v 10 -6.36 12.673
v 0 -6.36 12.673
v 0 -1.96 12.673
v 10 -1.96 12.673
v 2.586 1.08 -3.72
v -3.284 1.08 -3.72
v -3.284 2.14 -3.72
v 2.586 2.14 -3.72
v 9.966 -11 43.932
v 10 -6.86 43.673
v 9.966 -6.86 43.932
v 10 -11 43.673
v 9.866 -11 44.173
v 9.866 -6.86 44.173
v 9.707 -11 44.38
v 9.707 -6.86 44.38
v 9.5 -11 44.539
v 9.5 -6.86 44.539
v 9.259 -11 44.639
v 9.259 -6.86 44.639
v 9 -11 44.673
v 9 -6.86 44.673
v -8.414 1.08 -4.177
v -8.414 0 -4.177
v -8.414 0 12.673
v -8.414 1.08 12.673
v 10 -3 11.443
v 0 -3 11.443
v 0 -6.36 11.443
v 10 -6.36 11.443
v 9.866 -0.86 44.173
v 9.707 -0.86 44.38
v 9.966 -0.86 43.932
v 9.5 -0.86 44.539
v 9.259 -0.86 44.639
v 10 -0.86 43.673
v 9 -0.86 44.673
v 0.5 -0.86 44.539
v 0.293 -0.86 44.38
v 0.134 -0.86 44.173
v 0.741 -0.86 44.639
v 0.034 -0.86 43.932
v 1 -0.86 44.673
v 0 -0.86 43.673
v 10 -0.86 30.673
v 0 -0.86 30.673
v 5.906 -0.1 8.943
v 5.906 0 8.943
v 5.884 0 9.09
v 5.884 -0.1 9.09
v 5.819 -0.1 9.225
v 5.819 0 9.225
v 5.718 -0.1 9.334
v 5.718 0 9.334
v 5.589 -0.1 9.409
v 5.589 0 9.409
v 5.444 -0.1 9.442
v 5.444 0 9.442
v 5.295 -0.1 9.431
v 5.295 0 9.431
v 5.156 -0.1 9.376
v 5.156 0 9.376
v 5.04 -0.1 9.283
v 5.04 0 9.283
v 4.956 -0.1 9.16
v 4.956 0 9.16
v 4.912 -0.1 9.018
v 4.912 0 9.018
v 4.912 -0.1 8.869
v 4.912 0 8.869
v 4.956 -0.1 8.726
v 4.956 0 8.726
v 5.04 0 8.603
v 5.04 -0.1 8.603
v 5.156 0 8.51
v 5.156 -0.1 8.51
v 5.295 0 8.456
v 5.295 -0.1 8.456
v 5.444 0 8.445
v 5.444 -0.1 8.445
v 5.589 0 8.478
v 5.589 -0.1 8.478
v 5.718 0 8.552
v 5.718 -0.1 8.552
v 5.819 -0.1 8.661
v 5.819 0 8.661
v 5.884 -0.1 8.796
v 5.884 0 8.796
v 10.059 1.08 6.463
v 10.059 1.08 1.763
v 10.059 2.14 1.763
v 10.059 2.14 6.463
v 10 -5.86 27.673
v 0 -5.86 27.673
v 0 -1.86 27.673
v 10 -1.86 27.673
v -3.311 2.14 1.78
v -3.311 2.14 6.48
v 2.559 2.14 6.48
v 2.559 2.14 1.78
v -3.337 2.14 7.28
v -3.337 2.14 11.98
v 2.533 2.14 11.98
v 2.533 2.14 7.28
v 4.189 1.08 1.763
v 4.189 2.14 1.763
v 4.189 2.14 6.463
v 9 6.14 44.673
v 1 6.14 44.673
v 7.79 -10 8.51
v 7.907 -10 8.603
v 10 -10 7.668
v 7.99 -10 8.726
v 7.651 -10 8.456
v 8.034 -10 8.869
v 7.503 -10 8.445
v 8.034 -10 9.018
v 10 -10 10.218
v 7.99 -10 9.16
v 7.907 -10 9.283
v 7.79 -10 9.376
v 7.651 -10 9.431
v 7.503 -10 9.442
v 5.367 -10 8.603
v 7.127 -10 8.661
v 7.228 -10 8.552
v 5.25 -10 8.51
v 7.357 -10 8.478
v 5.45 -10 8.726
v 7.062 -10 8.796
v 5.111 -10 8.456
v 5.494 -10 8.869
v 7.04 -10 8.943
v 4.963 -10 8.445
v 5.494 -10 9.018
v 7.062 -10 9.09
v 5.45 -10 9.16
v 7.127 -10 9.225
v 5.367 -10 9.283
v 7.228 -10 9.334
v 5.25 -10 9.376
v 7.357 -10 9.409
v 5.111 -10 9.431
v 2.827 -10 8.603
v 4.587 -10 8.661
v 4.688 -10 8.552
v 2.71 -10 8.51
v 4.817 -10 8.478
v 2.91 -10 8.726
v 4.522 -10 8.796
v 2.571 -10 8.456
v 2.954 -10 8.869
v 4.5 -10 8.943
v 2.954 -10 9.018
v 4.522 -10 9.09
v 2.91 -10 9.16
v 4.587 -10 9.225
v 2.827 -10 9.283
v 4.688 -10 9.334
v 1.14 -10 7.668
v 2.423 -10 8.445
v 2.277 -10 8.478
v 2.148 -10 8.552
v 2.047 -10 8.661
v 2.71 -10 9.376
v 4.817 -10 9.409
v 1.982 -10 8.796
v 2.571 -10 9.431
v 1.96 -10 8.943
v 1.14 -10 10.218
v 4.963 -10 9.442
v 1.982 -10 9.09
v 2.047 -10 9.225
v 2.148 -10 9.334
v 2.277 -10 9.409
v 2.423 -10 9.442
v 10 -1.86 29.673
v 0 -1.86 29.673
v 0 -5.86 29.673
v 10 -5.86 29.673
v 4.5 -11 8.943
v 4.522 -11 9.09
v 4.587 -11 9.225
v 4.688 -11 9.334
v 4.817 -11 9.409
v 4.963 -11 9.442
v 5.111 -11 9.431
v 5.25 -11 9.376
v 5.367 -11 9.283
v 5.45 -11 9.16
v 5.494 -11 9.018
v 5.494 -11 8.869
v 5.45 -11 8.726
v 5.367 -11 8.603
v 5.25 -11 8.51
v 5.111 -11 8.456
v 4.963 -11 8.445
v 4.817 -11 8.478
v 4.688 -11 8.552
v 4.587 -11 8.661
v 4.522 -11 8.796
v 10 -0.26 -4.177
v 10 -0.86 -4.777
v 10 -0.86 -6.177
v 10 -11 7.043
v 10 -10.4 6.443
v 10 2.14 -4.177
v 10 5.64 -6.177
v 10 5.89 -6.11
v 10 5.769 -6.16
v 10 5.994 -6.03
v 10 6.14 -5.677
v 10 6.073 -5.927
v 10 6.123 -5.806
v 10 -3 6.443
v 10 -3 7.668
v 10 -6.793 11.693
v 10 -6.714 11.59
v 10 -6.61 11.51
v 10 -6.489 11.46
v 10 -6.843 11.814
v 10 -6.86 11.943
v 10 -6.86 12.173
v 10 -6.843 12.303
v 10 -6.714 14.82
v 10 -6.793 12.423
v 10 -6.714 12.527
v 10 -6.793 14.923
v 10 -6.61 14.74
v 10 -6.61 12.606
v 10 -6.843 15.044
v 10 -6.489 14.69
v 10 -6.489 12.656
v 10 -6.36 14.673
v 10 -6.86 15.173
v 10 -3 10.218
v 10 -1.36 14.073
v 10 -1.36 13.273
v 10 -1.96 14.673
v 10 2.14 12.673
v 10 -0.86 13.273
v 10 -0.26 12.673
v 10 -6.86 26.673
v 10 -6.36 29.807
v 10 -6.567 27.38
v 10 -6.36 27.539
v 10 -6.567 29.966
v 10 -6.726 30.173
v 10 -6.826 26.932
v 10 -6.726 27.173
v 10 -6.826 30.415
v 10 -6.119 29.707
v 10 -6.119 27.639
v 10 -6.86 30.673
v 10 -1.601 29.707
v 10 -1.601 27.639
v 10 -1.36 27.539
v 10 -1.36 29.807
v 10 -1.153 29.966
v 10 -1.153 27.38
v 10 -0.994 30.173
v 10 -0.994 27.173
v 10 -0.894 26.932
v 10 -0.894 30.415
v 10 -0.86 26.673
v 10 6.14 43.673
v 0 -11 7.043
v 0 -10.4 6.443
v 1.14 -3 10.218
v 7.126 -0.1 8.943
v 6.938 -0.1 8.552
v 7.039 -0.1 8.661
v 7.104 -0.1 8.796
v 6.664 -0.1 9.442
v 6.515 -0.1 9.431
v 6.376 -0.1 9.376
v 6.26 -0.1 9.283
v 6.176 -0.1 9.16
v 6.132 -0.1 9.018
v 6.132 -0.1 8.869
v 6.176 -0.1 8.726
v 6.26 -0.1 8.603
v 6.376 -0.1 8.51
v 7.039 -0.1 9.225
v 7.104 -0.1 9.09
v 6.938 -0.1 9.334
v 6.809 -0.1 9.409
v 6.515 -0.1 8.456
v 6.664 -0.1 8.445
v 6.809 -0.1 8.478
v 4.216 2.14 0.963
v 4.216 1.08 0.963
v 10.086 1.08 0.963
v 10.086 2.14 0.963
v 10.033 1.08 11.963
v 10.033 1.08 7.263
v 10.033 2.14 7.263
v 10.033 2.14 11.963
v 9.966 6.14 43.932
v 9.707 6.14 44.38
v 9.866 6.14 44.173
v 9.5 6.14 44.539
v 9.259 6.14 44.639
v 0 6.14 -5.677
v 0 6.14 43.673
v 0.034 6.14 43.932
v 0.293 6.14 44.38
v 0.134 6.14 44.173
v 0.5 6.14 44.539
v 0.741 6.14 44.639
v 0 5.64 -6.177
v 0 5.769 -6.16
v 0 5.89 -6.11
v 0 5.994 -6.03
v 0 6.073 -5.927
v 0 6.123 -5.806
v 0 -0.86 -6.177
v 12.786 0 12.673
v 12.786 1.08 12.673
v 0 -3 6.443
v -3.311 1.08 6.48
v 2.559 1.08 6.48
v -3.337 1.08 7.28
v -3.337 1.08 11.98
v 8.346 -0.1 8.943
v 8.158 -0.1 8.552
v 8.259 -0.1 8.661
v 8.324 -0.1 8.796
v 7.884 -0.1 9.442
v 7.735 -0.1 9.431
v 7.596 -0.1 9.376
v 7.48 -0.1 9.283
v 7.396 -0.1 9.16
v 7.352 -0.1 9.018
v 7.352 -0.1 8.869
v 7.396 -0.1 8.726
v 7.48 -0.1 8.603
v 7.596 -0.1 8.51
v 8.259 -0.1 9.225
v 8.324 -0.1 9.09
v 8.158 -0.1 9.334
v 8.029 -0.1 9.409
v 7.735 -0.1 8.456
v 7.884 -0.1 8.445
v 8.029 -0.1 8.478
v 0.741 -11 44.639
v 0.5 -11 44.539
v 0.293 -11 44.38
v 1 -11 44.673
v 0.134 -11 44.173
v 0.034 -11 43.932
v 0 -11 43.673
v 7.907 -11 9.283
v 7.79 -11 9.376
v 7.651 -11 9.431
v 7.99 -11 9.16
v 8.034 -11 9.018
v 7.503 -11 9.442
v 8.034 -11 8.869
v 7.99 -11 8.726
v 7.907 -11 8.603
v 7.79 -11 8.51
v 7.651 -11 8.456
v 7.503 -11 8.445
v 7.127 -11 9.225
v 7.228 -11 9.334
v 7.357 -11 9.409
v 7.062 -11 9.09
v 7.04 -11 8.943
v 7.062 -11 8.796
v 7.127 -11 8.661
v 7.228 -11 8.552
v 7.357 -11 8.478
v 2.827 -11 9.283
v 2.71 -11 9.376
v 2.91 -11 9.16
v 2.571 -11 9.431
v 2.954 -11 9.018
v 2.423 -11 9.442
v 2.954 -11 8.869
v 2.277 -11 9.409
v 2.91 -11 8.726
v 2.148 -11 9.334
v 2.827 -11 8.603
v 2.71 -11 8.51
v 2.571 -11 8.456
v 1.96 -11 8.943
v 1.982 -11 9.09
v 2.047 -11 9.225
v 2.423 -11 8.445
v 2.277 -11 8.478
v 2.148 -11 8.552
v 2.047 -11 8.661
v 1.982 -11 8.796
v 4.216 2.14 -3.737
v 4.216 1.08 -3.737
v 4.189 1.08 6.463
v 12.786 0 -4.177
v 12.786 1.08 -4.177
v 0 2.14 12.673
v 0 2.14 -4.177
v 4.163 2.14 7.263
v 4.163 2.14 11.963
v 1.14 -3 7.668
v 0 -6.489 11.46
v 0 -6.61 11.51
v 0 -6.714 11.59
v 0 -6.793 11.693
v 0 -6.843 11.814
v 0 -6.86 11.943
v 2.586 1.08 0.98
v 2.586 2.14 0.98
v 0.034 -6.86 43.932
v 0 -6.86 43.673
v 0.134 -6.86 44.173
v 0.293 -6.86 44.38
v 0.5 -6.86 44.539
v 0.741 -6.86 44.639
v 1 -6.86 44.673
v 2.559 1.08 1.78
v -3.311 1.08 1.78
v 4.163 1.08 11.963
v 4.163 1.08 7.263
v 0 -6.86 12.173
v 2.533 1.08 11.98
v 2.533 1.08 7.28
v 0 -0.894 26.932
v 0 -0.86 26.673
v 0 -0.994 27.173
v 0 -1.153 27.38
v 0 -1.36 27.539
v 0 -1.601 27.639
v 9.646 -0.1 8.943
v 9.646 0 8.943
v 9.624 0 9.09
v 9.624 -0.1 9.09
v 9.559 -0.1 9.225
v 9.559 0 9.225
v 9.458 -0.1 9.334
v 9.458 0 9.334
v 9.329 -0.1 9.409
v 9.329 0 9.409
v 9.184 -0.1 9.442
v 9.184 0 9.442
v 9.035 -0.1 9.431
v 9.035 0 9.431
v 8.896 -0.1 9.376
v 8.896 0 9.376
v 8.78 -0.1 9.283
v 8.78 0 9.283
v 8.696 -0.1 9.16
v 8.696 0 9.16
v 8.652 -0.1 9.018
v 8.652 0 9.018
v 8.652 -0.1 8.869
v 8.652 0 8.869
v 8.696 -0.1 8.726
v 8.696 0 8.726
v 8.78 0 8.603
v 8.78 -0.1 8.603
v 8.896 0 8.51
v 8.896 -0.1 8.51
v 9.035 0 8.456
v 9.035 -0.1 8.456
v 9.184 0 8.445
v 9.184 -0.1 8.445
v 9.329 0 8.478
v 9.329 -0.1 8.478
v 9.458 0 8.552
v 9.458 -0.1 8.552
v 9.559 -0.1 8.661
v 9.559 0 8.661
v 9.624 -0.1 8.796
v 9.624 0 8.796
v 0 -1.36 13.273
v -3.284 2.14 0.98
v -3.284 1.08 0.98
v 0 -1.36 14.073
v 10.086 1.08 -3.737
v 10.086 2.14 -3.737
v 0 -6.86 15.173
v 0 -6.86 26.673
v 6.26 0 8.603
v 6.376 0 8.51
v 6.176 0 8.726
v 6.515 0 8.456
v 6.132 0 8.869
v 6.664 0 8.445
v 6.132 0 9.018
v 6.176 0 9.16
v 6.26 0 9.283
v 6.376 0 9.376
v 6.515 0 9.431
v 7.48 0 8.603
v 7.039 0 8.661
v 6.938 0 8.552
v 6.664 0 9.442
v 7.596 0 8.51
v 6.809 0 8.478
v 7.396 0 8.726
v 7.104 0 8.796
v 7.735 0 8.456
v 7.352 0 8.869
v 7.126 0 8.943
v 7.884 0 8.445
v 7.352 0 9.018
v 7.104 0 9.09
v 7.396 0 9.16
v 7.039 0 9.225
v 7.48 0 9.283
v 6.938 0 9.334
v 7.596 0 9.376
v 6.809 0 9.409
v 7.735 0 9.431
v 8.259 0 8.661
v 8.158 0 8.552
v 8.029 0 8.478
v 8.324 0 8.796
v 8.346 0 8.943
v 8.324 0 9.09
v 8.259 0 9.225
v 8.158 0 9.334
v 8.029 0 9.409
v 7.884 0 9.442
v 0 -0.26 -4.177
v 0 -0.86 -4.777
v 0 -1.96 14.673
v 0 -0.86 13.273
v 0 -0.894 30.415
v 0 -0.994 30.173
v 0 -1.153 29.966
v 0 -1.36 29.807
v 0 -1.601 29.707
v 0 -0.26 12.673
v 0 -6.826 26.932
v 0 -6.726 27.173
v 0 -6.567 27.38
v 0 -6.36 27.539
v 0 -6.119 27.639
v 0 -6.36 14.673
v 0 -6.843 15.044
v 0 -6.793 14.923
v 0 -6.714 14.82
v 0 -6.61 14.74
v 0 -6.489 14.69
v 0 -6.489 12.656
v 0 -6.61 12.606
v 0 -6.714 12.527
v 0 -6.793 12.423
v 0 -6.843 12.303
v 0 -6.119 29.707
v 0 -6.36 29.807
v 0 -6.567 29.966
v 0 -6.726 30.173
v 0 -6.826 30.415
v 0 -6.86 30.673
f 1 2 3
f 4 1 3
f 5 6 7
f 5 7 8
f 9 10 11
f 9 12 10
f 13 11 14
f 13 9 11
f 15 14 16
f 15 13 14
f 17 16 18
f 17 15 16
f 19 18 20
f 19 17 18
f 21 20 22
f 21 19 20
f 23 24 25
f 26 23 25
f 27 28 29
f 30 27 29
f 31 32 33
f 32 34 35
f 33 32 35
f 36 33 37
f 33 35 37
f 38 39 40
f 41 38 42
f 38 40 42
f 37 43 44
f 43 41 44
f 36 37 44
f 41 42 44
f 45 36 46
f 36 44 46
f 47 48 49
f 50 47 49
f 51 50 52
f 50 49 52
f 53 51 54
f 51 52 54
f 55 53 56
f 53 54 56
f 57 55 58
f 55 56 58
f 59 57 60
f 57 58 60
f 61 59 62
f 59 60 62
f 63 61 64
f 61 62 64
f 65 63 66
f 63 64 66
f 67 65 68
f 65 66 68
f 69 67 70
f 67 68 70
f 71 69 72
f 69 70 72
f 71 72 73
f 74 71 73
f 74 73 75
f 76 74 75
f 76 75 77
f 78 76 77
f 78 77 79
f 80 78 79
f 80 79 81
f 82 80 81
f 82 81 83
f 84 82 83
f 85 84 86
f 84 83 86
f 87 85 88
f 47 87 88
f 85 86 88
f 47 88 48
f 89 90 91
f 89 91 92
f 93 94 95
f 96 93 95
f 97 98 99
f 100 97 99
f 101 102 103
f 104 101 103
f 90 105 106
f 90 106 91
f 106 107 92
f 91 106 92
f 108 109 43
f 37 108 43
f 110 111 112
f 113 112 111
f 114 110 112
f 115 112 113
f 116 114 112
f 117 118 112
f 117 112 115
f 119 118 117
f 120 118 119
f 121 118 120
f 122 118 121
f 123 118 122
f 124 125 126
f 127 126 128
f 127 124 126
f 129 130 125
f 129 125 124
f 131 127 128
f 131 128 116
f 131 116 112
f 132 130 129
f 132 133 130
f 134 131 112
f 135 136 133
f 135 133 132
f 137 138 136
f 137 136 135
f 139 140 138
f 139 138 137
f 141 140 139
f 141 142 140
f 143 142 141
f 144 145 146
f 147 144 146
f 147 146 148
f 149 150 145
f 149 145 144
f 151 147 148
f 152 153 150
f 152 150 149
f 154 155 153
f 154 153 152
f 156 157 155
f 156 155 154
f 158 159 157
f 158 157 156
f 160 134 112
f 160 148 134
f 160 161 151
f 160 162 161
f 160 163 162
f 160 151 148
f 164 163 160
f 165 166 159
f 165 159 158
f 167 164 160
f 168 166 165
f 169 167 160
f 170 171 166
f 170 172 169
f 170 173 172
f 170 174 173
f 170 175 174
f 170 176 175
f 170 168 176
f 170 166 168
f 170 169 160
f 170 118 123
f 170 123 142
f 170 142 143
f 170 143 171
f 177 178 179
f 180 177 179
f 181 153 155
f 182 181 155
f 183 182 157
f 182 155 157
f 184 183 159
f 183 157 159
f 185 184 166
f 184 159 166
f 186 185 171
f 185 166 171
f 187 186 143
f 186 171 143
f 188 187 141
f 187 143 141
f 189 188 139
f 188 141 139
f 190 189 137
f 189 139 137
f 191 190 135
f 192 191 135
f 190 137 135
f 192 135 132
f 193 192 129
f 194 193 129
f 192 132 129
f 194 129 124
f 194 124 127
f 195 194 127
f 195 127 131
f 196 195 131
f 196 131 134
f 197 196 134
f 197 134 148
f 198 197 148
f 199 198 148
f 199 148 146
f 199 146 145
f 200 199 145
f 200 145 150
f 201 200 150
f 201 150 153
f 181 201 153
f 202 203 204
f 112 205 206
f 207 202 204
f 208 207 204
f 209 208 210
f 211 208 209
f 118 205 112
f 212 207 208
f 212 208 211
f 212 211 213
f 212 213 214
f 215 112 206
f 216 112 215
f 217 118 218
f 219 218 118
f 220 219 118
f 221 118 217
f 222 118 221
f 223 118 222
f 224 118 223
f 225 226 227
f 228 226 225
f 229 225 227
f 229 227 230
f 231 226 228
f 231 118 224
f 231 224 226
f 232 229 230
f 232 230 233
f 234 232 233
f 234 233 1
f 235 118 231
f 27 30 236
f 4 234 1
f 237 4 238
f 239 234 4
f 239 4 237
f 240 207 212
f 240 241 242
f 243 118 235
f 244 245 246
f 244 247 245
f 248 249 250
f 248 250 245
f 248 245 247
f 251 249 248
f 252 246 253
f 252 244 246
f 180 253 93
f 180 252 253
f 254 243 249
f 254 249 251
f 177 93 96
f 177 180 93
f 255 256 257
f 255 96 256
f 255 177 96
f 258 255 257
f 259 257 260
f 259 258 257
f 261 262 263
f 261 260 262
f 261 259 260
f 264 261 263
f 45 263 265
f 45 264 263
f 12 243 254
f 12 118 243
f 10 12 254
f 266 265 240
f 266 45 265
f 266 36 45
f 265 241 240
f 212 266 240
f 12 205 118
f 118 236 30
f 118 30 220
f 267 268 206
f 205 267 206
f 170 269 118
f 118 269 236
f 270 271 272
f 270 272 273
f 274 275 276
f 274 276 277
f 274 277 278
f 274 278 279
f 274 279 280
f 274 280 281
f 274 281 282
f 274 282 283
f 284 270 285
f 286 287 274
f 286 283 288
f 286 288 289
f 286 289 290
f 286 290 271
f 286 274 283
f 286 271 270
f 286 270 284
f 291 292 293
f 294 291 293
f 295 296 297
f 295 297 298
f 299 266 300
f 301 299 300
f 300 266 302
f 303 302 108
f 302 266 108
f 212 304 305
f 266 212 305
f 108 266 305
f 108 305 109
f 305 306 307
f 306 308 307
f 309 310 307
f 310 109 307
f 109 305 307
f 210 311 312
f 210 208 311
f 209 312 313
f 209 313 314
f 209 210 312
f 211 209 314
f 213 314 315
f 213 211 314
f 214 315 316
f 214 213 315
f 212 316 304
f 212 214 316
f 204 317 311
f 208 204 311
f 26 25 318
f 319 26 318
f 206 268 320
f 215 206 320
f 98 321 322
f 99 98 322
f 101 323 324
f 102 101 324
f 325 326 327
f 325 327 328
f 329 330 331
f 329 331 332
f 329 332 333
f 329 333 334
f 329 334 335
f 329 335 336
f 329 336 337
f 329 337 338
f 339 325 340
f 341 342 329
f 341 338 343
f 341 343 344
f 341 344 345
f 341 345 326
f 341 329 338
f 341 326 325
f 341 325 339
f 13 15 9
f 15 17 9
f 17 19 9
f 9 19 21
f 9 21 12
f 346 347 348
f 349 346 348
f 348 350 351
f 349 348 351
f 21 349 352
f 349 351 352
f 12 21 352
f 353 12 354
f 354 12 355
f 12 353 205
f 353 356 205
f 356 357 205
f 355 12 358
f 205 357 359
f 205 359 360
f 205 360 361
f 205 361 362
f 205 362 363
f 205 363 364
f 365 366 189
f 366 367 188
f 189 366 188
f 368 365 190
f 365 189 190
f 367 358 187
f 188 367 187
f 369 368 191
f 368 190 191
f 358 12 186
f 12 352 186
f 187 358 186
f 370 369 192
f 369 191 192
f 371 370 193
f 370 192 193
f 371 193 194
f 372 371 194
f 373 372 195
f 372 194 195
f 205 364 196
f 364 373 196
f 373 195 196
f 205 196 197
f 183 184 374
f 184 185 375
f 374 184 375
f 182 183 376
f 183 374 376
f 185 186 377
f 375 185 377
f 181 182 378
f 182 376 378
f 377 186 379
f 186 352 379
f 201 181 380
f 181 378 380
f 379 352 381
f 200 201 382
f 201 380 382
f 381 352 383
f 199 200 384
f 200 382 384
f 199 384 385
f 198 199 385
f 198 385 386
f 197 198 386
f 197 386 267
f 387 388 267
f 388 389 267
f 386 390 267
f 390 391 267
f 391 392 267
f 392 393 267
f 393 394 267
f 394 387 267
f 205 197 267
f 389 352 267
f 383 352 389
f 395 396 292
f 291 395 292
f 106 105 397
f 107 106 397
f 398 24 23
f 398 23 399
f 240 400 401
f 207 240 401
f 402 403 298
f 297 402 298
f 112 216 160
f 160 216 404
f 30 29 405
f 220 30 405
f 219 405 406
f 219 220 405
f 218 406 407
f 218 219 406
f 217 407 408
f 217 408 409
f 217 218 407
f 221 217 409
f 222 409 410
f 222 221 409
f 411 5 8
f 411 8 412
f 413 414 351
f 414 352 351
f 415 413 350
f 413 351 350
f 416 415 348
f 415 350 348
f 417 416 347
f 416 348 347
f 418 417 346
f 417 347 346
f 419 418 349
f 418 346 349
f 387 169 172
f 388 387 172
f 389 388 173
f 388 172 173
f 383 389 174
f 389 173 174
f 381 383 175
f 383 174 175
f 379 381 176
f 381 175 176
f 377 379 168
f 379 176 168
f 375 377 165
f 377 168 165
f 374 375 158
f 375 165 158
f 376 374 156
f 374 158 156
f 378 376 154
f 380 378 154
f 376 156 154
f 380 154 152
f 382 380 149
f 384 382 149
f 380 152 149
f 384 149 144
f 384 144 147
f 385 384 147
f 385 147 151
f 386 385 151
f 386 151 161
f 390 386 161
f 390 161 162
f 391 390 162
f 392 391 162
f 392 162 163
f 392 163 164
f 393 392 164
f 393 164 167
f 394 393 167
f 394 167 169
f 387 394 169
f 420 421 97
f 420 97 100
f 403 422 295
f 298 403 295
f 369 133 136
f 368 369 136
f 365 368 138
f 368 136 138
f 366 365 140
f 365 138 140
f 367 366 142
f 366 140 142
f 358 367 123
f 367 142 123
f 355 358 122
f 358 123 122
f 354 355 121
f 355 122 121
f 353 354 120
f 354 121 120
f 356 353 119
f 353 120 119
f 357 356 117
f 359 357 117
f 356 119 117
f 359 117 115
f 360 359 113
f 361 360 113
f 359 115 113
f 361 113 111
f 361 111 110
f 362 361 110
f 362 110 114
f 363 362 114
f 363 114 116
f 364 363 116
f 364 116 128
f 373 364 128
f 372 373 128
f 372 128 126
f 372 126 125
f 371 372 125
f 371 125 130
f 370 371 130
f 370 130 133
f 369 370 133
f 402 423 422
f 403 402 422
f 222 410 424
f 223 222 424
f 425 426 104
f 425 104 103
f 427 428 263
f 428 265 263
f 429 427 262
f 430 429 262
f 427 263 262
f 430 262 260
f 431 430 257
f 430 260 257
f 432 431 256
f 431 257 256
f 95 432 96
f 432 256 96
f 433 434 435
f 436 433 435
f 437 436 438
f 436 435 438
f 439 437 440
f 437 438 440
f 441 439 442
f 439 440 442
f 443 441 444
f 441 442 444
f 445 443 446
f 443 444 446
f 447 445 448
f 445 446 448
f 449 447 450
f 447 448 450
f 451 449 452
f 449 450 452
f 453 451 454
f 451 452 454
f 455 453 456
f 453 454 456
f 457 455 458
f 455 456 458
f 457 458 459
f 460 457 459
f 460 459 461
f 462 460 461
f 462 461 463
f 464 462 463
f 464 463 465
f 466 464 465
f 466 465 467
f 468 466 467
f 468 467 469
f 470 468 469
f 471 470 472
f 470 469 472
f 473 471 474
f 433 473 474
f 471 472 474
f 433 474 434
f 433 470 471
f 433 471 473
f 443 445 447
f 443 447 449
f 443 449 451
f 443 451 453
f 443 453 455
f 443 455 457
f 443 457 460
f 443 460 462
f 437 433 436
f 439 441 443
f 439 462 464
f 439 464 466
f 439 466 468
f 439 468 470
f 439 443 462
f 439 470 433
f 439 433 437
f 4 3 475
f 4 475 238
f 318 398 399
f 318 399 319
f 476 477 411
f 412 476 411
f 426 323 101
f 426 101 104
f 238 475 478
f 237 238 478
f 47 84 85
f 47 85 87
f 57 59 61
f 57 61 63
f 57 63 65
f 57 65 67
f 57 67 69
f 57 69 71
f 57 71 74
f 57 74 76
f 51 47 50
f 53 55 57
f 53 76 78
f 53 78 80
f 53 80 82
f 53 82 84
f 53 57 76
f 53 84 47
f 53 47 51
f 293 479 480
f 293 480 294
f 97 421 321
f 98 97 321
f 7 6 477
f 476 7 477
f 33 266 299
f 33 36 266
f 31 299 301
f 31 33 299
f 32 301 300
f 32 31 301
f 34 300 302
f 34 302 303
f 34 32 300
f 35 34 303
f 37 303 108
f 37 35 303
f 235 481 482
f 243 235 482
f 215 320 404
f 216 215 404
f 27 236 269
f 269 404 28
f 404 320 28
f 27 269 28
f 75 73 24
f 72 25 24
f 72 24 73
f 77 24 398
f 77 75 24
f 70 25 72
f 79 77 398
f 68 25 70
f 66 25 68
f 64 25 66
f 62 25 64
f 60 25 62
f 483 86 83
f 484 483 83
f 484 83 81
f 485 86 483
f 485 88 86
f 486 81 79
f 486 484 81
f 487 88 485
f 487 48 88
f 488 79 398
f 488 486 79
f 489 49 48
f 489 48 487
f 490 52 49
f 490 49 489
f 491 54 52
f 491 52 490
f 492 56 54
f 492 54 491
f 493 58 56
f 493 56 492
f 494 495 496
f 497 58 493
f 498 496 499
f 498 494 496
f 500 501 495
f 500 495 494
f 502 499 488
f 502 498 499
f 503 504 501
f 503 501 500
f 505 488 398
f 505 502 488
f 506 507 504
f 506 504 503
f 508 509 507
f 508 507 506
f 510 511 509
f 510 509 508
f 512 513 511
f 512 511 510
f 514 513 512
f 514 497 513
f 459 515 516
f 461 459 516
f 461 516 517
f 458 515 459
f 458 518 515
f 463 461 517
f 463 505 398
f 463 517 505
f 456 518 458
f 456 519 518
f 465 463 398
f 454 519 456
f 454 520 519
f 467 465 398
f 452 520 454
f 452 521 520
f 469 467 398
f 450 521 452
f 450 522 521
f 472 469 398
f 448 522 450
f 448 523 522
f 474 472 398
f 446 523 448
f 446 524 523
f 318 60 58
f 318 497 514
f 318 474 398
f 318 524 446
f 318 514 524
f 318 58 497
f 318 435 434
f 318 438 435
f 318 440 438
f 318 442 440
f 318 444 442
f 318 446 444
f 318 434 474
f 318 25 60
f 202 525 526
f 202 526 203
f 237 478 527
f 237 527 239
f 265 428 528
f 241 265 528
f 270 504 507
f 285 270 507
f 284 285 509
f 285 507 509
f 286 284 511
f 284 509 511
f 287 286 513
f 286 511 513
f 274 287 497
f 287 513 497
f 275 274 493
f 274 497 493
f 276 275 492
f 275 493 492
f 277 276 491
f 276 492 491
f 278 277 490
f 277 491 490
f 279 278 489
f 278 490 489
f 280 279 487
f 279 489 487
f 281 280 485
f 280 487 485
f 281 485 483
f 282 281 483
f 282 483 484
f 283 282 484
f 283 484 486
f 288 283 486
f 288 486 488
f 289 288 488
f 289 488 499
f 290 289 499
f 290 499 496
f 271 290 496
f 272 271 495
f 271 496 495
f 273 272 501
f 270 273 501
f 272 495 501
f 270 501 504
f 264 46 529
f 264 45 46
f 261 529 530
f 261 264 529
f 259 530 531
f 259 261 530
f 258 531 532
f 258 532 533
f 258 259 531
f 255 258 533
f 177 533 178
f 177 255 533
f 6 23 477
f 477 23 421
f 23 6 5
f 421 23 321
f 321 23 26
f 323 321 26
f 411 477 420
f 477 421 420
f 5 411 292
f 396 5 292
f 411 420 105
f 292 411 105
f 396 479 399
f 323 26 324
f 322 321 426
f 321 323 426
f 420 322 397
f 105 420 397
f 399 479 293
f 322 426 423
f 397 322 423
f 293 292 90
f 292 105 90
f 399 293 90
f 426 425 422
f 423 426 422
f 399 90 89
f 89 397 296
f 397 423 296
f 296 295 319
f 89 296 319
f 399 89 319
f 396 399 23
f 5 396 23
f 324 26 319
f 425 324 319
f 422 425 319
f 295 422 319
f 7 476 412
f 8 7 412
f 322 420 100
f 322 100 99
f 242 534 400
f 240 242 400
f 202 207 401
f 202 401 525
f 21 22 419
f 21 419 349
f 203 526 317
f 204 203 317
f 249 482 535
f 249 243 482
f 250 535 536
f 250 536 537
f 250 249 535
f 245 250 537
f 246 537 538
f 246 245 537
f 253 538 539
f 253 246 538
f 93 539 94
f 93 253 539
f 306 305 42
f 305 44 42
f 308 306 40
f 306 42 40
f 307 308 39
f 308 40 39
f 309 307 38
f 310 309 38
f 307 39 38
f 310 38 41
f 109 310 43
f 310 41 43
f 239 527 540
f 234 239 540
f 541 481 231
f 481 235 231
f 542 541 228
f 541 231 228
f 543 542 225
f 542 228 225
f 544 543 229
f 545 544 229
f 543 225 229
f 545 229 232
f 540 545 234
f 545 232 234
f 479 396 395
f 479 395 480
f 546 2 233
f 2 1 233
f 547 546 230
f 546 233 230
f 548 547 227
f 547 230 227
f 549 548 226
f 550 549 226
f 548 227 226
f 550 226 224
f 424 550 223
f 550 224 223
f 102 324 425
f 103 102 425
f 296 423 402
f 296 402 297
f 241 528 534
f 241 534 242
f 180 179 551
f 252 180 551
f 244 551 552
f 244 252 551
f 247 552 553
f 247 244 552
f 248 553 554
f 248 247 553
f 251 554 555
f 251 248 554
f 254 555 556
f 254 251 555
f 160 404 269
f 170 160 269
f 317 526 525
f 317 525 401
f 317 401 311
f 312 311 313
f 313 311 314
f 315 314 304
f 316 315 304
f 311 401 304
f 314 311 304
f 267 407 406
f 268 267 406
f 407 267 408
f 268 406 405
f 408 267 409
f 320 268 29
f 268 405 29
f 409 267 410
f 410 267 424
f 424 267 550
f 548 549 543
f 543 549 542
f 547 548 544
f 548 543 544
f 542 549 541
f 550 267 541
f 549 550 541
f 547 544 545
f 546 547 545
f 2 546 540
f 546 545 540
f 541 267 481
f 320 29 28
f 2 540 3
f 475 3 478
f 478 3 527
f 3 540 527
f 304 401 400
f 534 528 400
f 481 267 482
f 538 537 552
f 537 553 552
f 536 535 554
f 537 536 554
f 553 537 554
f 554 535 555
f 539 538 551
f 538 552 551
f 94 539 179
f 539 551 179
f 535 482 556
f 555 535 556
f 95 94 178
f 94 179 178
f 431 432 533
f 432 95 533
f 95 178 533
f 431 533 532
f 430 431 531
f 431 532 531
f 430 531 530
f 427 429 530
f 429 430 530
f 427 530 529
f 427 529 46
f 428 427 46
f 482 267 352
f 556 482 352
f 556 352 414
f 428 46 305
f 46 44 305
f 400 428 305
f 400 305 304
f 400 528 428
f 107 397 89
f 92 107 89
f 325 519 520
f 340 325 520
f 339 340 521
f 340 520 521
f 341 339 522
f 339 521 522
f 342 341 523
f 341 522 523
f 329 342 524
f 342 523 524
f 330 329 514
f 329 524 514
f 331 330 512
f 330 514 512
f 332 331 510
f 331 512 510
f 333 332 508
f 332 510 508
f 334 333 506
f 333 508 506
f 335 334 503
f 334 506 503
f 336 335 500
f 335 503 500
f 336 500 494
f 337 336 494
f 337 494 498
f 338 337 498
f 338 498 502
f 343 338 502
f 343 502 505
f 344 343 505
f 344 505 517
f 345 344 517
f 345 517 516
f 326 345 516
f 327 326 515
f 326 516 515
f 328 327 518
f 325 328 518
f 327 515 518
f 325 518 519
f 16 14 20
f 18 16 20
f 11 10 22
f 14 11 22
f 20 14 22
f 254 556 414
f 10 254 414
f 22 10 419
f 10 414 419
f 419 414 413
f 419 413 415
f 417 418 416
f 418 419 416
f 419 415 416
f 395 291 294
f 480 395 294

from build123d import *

# Parameters (mm, degrees)
F0_W     = 21.2
F0_H     = 16.85
F0_W_2   = 5.87
F0_H_2   = 4.7
F0_R     = 0.5
F1_DEPTH = 1.08
F2_DEPTH = 2.14
F3_DEPTH = 0.1
F5_DEPTH = 10
F6_W     = 7.72
F6_H     = 2.55
F6_R     = 0.5
F6_W_2   = 1.14
F7_DEPTH = 7
F8_DEPTH = 8.001
F9_R     = 1
F10_SIZE = 0.6
F11_R    = 0.5


with BuildPart() as f1:
    # F0 (on Front) → F1 (new body)
    with BuildSketch(Plane.XZ):
        with Locations((2.18614, 4.248341)):
            Rectangle(F0_W, F0_H)
        with Locations((-0.348842, -1.370112)):
            Rectangle(F0_W_2, F0_H_2, mode=Mode.SUBTRACT)
        with Locations((-0.375639, 4.129823)):
            Rectangle(F0_W_2, F0_H_2, mode=Mode.SUBTRACT)
        with Locations((7.15114, -1.386659)):
            Rectangle(F0_W_2, F0_H_2, mode=Mode.SUBTRACT)
        with Locations((7.124343, 4.113276)):
            Rectangle(F0_W_2, F0_H_2, mode=Mode.SUBTRACT)
        with Locations((-0.402437, 9.629757)):
            Rectangle(F0_W_2, F0_H_2, mode=Mode.SUBTRACT)
        with Locations((7.097545, 9.613211)):
            Rectangle(F0_W_2, F0_H_2, mode=Mode.SUBTRACT)
        with Locations((-0.402437, 9.629757)):
            Rectangle(F0_W_2, F0_H_2)
        with Locations((7.097545, 9.613211)):
            Rectangle(F0_W_2, F0_H_2)
        with Locations((5.40614, 8.943113)):
            Circle(F0_R, mode=Mode.SUBTRACT)
        with Locations((6.62614, 8.943113)):
            Circle(F0_R, mode=Mode.SUBTRACT)
        with Locations((7.84614, 8.943113)):
            Circle(F0_R, mode=Mode.SUBTRACT)
        with Locations((9.14614, 8.943113)):
            Circle(F0_R, mode=Mode.SUBTRACT)
        with Locations((-0.375639, 4.129823)):
            Rectangle(F0_W_2, F0_H_2)
        with Locations((7.124343, 4.113276)):
            Rectangle(F0_W_2, F0_H_2)
        with Locations((-0.348842, -1.370112)):
            Rectangle(F0_W_2, F0_H_2)
        with Locations((7.15114, -1.386659)):
            Rectangle(F0_W_2, F0_H_2)
    extrude(amount=-F1_DEPTH)

    # F0 (on Front) → F2 (join)
    with BuildSketch(Plane.XZ):
        with Locations((-0.348842, -1.370112)):
            Rectangle(F0_W_2, F0_H_2)
        with Locations((-0.375639, 4.129823)):
            Rectangle(F0_W_2, F0_H_2)
        with Locations((-0.402437, 9.629757)):
            Rectangle(F0_W_2, F0_H_2)
        with Locations((7.15114, -1.386659)):
            Rectangle(F0_W_2, F0_H_2)
        with Locations((7.124343, 4.113276)):
            Rectangle(F0_W_2, F0_H_2)
        with Locations((7.097545, 9.613211)):
            Rectangle(F0_W_2, F0_H_2)
        with Locations((5.40614, 8.943113)):
            Circle(F0_R, mode=Mode.SUBTRACT)
        with Locations((6.62614, 8.943113)):
            Circle(F0_R, mode=Mode.SUBTRACT)
        with Locations((7.84614, 8.943113)):
            Circle(F0_R, mode=Mode.SUBTRACT)
        with Locations((9.14614, 8.943113)):
            Circle(F0_R, mode=Mode.SUBTRACT)
        with Locations((5.40614, 8.943113)):
            Circle(F0_R)
        with Locations((6.62614, 8.943113)):
            Circle(F0_R)
        with Locations((7.84614, 8.943113)):
            Circle(F0_R)
        with Locations((9.14614, 8.943113)):
            Circle(F0_R)
    extrude(amount=-F2_DEPTH)

    # F0 (on Front) → F3 (join)
    with BuildSketch(Plane.XZ):
        with Locations((5.40614, 8.943113)):
            Circle(F0_R)
        with Locations((6.62614, 8.943113)):
            Circle(F0_R)
        with Locations((7.84614, 8.943113)):
            Circle(F0_R)
        with Locations((9.14614, 8.943113)):
            Circle(F0_R)
    extrude(amount=F3_DEPTH)


with BuildPart() as f5:
    # F4 (on Right) → F5 (new body)
    with BuildSketch(Plane.YZ):
        Polygon((2.14, 12.673341), (2.14, 11.979757), (2.14, 7.279757), (2.14, -4.176659), (-0.86, -4.176659), (-0.86, -6.176659), (6.14, -6.176659), (6.14, 44.673341), (-0.86, 44.673341), (-0.86, 29.673341), (-6.86, 29.673341), (-6.86, 44.673341), (-11, 44.673341), (-11, 6.443113), (-3, 6.443113), (-3, 11.443113), (-6.86, 11.443113), (-6.86, 12.673341), (-1.36, 12.673341), (-1.36, 14.673341), (-6.86, 14.673341), (-6.86, 27.673341), (-0.86, 27.673341), (-0.86, 12.673341), (0, 12.673341), (1.08, 12.673341), align=None)
    extrude(amount=F5_DEPTH)

    # F6 (on face) → F7 (cut)
    with BuildSketch(Plane(origin=(0, -3, 0), x_dir=(-1, 0, 0), z_dir=(0, 1, 0))):
        with Locations((-5, 8.943113)):
            Rectangle(F6_W, F6_H)
        with Locations((-7.54, 8.943113)):
            Circle(F6_R, mode=Mode.SUBTRACT)
        with Locations((-5, 8.943113)):
            Circle(F6_R, mode=Mode.SUBTRACT)
        with Locations((-2.46, 8.943113)):
            Circle(F6_R, mode=Mode.SUBTRACT)
        with Locations((-9.43, 8.943113)):
            Rectangle(F6_W_2, F6_H)
        with Locations((-7.54, 8.943113)):
            Circle(F6_R)
        with Locations((-5, 8.943113)):
            Circle(F6_R)
        with Locations((-2.46, 8.943113)):
            Circle(F6_R)
    extrude(amount=-F7_DEPTH, mode=Mode.SUBTRACT)

    # F6 (on face) → F8 (cut, through all)
    with BuildSketch(Plane(origin=(0, -3, 0), x_dir=(-1, 0, 0), z_dir=(0, 1, 0))):
        with Locations((-2.46, 8.943113)):
            Circle(F6_R)
        with Locations((-5, 8.943113)):
            Circle(F6_R)
        with Locations((-7.54, 8.943113)):
            Circle(F6_R)
    extrude(amount=-F8_DEPTH, mode=Mode.SUBTRACT)

    # F9
    f9_edges = [f5.edges().sort_by_distance(p)[0] for p in [
        (5, -0.86, 29.673341),
        (5, -0.86, 27.673341),
        (5, -6.86, 27.673341),
        (5, -6.86, 29.673341),
        (10, -8.93, 44.673341),
        (0, -8.93, 44.673341),
        (0, 2.64, 44.673341),
        (10, 2.64, 44.673341),
    ]]
    fillet(f9_edges, radius=F9_R)

    # F10
    f10_edges = [f5.edges().sort_by_distance(p)[0] for p in [
        (5, -11, 6.443113),
        (5, -0.86, -4.176659),
        (5, -0.86, 12.673341),
        (5, -1.36, 12.673341),
        (5, -1.36, 14.673341),
    ]]
    chamfer(f10_edges, length=F10_SIZE)

    # F11
    f11_edges = [f5.edges().sort_by_distance(p)[0] for p in [
        (5, -6.86, 12.673341),
        (5, -6.86, 14.673341),
        (5, -6.86, 11.443113),
        (5, 6.14, -6.176659),
    ]]
    fillet(f11_edges, radius=F11_R)


solid = Compound([f1.part, f5.part])
